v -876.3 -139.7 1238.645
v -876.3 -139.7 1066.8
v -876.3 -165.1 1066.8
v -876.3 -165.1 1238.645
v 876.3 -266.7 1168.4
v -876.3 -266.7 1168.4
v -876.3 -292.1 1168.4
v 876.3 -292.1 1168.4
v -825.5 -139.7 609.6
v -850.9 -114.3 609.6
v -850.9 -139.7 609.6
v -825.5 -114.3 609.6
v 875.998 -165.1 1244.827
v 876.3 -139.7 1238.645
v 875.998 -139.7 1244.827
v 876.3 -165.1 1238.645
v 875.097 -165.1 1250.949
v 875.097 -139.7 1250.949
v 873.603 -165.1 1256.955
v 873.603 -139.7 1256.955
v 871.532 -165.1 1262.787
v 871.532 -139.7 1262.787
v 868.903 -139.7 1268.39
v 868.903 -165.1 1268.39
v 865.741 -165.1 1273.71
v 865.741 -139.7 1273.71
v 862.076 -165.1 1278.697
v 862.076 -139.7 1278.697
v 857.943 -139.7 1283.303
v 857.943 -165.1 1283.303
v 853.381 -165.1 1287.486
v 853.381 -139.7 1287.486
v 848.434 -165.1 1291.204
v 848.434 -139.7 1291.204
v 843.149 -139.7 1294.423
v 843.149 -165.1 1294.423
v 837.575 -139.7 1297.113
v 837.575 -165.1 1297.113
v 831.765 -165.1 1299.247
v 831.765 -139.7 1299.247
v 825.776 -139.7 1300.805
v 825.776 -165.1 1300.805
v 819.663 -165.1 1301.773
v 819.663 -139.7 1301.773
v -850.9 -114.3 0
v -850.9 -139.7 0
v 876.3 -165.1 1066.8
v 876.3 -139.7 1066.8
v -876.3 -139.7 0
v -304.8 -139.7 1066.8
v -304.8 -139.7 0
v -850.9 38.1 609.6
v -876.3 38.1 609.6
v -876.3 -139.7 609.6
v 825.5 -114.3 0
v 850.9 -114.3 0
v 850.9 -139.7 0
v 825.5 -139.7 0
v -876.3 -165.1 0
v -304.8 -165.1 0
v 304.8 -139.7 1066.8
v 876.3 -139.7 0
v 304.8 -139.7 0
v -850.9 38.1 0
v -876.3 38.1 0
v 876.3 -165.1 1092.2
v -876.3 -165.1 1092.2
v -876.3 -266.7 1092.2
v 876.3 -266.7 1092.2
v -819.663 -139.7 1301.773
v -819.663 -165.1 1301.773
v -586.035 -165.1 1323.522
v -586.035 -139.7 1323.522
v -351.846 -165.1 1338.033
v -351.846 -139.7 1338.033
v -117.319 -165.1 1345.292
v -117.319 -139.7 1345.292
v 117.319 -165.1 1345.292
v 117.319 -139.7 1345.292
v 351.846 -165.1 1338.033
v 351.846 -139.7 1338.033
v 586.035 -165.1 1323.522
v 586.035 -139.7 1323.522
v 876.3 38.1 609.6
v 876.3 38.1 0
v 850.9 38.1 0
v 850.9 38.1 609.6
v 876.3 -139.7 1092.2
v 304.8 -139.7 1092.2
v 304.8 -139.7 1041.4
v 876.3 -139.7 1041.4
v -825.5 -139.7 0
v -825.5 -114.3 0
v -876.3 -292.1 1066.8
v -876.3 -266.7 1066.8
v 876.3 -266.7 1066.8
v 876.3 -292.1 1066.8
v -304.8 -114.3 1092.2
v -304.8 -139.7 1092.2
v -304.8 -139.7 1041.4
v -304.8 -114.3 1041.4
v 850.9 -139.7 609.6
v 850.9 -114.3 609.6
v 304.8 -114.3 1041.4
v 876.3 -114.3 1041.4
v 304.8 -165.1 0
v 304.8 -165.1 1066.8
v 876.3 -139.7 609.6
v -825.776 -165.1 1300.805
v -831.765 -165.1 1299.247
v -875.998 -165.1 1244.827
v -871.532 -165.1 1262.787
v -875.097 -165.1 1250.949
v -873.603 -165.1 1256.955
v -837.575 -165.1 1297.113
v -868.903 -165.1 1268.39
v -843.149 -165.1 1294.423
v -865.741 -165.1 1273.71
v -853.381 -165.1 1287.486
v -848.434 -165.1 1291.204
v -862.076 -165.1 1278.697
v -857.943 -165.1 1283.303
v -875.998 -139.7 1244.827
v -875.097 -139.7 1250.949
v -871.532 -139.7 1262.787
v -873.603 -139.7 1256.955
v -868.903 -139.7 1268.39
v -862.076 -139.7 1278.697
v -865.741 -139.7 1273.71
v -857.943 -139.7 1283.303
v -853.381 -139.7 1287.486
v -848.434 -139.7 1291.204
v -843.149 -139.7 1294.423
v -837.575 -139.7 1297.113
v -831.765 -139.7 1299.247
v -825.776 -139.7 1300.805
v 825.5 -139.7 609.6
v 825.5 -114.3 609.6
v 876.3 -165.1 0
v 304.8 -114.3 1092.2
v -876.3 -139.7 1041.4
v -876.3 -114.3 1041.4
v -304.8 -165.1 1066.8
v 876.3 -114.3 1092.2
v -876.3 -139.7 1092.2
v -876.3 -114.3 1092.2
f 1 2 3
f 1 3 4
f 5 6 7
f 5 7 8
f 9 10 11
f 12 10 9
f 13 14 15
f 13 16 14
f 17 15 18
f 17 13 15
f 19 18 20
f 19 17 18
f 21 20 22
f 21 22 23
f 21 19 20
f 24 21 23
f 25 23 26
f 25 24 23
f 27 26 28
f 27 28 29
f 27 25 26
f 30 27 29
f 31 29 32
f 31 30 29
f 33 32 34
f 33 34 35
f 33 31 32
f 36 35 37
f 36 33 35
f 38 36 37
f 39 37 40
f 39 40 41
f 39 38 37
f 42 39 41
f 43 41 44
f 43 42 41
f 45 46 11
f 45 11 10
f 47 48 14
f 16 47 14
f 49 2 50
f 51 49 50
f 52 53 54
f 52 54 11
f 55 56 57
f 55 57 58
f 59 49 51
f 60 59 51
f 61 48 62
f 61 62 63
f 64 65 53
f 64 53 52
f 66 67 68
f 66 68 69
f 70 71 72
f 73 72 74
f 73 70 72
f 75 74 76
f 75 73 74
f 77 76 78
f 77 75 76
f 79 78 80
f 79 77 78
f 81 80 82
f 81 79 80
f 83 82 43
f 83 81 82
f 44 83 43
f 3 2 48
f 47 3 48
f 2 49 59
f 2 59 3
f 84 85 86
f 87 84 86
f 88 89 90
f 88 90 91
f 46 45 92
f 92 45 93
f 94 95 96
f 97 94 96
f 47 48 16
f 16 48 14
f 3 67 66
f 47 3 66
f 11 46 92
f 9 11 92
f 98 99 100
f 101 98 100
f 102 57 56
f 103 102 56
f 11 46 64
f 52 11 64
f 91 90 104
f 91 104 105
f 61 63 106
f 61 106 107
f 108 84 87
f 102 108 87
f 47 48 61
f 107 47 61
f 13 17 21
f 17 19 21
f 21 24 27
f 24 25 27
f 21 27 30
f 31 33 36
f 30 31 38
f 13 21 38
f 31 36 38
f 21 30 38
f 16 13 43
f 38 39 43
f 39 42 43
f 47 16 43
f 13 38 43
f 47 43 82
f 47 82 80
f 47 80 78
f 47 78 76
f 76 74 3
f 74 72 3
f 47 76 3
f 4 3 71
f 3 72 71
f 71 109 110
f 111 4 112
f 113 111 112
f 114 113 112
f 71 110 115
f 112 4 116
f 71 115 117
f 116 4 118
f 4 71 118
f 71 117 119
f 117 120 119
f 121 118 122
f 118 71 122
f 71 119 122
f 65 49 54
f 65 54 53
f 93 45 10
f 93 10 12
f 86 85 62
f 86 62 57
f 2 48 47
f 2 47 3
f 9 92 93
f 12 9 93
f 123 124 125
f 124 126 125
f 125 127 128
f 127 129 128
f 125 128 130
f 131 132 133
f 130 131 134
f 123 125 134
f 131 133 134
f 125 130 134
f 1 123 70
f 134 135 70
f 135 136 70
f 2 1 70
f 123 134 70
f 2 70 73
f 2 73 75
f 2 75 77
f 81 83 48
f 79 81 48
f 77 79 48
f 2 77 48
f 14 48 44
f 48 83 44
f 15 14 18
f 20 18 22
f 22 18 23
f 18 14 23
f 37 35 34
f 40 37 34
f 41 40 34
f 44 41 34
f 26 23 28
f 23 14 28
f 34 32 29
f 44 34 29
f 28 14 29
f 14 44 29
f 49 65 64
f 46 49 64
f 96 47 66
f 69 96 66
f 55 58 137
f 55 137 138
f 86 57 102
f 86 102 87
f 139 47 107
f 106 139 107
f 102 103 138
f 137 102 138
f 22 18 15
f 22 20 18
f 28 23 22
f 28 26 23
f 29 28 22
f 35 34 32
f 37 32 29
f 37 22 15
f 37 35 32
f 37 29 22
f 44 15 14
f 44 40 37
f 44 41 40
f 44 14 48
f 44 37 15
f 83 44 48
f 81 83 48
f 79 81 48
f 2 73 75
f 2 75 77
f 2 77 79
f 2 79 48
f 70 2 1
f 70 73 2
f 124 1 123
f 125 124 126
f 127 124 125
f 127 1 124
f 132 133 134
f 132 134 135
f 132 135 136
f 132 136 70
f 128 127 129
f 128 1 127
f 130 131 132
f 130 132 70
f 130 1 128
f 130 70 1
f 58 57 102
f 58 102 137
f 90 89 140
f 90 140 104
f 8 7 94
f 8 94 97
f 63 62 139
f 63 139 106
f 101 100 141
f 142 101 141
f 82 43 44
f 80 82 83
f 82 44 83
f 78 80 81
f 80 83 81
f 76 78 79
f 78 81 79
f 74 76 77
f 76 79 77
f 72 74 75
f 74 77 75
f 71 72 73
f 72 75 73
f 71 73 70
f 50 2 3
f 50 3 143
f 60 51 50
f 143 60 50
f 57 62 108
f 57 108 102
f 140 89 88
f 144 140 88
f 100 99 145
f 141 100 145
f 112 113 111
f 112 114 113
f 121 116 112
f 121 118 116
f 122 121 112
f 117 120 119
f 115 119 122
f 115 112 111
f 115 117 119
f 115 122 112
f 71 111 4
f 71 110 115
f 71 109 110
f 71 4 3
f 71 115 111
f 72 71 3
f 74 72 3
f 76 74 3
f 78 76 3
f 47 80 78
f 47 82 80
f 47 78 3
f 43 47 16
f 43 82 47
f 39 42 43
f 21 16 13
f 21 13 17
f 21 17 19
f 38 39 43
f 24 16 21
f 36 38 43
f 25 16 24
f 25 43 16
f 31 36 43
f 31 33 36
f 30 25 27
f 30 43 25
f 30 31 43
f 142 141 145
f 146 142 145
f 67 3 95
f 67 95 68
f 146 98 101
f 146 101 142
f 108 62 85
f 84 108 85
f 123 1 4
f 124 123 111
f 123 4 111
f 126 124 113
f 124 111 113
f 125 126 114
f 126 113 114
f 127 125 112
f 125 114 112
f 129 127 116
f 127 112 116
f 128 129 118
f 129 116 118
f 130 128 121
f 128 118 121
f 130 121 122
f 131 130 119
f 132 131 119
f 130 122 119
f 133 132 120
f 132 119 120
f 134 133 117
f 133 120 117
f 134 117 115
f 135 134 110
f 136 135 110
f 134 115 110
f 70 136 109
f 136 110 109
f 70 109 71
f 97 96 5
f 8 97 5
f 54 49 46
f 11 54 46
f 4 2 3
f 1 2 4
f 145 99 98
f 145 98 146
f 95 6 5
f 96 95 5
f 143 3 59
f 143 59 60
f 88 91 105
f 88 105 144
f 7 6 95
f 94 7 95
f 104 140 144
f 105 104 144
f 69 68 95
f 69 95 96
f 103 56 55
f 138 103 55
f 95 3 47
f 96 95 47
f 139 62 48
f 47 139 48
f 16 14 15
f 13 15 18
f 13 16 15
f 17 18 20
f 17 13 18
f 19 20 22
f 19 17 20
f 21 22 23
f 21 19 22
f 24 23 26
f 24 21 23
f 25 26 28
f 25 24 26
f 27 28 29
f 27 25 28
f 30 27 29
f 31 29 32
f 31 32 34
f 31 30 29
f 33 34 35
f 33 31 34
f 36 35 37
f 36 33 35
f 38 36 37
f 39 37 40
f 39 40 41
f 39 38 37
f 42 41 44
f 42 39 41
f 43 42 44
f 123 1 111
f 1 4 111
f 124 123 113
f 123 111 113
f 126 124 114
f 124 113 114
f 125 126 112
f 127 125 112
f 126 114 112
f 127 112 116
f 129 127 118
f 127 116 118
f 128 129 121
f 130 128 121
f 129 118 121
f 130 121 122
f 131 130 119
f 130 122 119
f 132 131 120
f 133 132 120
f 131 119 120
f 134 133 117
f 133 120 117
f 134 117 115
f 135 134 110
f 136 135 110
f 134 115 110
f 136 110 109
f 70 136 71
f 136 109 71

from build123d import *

# Parameters (mm, degrees)
F0_W      = 25.4
F0_H      = 177.8
F1_DEPTH  = 609.6
F2_W      = 25.4
F2_H      = 25.4
F3_DEPTH  = 609.6
F4_W      = 571.5
F4_H      = 1066.8
F5_DEPTH  = 25.4
F7_DEPTH  = 25.4
F8_W      = 571.5
F8_H      = 25.4
F9_DEPTH  = 25.4
F12_R     = 63.5
F12_2_R   = 63.5
F13_W     = 1752.6
F13_H     = 25.4
F14_DEPTH = 101.6
F15_W     = 1752.6
F15_H     = 76.2
F15_H_2   = 25.4
F16_DEPTH = 25.4


with BuildPart() as f1:
    # F0 (on Top) → F1 (new body)
    with BuildSketch(Plane.XY):
        with Locations((-863.6, -50.8)):
            Rectangle(F0_W, F0_H)
    extrude(amount=F1_DEPTH)


with BuildPart() as f3:
    # F2 (on Top) → F3 (new body)
    with BuildSketch(Plane.XY):
        with Locations((-838.2, -127)):
            Rectangle(F2_W, F2_H)
    extrude(amount=F3_DEPTH)


with BuildPart() as f5:
    # F4 (on face) → F5 (new body)
    with BuildSketch(Plane.XZ.offset(139.7)):
        with Locations((-590.55, 533.4)):
            Rectangle(F4_W, F4_H)
    extrude(amount=F5_DEPTH)


with BuildPart() as f7:
    # F6 (on face) → F7 (new body)
    with BuildSketch(Plane(origin=(0, -139.7, 0), x_dir=(-1, 0, 0), z_dir=(0, 1, 0))):
        with BuildLine():
            Line((304.8, 1066.8), (876.3, 1066.8))
            Line((876.3, 1066.8), (876.3, 1295.4))
            ThreePointArc((876.3, 1295.4), (438.8856143689, 1333.4893478642), (0, 1346.2))
            Line((0, 1346.2), (0, 1066.8))
            Line((0, 1066.8), (304.8, 1066.8))
        make_face()
    extrude(amount=-F7_DEPTH)

    # F10: F7 across plane


with BuildPart() as f9:
    # F8 (on face) → F9 (new body)
    with BuildSketch(Plane(origin=(0, -139.7, 0), x_dir=(-1, 0, 0), z_dir=(0, 1, 0))):
        with Locations((590.55, 1079.5)):
            Rectangle(F8_W, F8_H)
        with Locations((590.55, 1054.1)):
            Rectangle(F8_W, F8_H)
    extrude(amount=F9_DEPTH)


with BuildPart() as f7_1:
    add(f7.part)
    add(f7.part.mirror(Plane.YZ))


with BuildPart() as f11_1:
    # F11: instance of F9
    add(f9.part.mirror(Plane.YZ))


with BuildPart() as f11_2:
    # F11: instance of F5
    add(f5.part.mirror(Plane.YZ))


with BuildPart() as f11_3:
    # F11: instance of F3
    add(f3.part.mirror(Plane.YZ))


with BuildPart() as f11_4:
    # F11: instance of F1
    add(f1.part.mirror(Plane.YZ))


with BuildPart() as f11_5:
    # F11: instance of F7
    add(f7_1.part.mirror(Plane.YZ))

    # F12#2
    f12_2_edges = [f11_5.edges().sort_by_distance(p)[0] for p in [
        (-876.3, -152.4, 1295.4),
        (876.3, -152.4, 1295.4),
    ]]
    fillet(f12_2_edges, radius=F12_2_R)


with BuildPart() as f7_2:
    add(f7_1.part)

    # F12
    f12_edges = [f7_2.edges().sort_by_distance(p)[0] for p in [
        (-876.3, -152.4, 1295.4),
        (876.3, -152.4, 1295.4),
    ]]
    fillet(f12_edges, radius=F12_R)


with BuildPart() as f14:
    # F13 (on face) → F14 (new body)
    with BuildSketch(Plane.XZ.offset(165.1)):
        with Locations((0, 1079.5)):
            Rectangle(F13_W, F13_H)
    extrude(amount=F14_DEPTH)


with BuildPart() as f16:
    # F15 (on face) → F16 (new body)
    with BuildSketch(Plane.XZ.offset(266.7)):
        with Locations((0, 1130.3)):
            Rectangle(F15_W, F15_H)
        with Locations((0, 1079.5)):
            Rectangle(F15_W, F15_H_2)
    extrude(amount=F16_DEPTH)


solid = Compound([f1.part, f3.part, f5.part, f9.part, f11_1.part, f11_2.part, f11_3.part, f11_4.part, f11_5.part, f7_2.part, f14.part, f16.part])
